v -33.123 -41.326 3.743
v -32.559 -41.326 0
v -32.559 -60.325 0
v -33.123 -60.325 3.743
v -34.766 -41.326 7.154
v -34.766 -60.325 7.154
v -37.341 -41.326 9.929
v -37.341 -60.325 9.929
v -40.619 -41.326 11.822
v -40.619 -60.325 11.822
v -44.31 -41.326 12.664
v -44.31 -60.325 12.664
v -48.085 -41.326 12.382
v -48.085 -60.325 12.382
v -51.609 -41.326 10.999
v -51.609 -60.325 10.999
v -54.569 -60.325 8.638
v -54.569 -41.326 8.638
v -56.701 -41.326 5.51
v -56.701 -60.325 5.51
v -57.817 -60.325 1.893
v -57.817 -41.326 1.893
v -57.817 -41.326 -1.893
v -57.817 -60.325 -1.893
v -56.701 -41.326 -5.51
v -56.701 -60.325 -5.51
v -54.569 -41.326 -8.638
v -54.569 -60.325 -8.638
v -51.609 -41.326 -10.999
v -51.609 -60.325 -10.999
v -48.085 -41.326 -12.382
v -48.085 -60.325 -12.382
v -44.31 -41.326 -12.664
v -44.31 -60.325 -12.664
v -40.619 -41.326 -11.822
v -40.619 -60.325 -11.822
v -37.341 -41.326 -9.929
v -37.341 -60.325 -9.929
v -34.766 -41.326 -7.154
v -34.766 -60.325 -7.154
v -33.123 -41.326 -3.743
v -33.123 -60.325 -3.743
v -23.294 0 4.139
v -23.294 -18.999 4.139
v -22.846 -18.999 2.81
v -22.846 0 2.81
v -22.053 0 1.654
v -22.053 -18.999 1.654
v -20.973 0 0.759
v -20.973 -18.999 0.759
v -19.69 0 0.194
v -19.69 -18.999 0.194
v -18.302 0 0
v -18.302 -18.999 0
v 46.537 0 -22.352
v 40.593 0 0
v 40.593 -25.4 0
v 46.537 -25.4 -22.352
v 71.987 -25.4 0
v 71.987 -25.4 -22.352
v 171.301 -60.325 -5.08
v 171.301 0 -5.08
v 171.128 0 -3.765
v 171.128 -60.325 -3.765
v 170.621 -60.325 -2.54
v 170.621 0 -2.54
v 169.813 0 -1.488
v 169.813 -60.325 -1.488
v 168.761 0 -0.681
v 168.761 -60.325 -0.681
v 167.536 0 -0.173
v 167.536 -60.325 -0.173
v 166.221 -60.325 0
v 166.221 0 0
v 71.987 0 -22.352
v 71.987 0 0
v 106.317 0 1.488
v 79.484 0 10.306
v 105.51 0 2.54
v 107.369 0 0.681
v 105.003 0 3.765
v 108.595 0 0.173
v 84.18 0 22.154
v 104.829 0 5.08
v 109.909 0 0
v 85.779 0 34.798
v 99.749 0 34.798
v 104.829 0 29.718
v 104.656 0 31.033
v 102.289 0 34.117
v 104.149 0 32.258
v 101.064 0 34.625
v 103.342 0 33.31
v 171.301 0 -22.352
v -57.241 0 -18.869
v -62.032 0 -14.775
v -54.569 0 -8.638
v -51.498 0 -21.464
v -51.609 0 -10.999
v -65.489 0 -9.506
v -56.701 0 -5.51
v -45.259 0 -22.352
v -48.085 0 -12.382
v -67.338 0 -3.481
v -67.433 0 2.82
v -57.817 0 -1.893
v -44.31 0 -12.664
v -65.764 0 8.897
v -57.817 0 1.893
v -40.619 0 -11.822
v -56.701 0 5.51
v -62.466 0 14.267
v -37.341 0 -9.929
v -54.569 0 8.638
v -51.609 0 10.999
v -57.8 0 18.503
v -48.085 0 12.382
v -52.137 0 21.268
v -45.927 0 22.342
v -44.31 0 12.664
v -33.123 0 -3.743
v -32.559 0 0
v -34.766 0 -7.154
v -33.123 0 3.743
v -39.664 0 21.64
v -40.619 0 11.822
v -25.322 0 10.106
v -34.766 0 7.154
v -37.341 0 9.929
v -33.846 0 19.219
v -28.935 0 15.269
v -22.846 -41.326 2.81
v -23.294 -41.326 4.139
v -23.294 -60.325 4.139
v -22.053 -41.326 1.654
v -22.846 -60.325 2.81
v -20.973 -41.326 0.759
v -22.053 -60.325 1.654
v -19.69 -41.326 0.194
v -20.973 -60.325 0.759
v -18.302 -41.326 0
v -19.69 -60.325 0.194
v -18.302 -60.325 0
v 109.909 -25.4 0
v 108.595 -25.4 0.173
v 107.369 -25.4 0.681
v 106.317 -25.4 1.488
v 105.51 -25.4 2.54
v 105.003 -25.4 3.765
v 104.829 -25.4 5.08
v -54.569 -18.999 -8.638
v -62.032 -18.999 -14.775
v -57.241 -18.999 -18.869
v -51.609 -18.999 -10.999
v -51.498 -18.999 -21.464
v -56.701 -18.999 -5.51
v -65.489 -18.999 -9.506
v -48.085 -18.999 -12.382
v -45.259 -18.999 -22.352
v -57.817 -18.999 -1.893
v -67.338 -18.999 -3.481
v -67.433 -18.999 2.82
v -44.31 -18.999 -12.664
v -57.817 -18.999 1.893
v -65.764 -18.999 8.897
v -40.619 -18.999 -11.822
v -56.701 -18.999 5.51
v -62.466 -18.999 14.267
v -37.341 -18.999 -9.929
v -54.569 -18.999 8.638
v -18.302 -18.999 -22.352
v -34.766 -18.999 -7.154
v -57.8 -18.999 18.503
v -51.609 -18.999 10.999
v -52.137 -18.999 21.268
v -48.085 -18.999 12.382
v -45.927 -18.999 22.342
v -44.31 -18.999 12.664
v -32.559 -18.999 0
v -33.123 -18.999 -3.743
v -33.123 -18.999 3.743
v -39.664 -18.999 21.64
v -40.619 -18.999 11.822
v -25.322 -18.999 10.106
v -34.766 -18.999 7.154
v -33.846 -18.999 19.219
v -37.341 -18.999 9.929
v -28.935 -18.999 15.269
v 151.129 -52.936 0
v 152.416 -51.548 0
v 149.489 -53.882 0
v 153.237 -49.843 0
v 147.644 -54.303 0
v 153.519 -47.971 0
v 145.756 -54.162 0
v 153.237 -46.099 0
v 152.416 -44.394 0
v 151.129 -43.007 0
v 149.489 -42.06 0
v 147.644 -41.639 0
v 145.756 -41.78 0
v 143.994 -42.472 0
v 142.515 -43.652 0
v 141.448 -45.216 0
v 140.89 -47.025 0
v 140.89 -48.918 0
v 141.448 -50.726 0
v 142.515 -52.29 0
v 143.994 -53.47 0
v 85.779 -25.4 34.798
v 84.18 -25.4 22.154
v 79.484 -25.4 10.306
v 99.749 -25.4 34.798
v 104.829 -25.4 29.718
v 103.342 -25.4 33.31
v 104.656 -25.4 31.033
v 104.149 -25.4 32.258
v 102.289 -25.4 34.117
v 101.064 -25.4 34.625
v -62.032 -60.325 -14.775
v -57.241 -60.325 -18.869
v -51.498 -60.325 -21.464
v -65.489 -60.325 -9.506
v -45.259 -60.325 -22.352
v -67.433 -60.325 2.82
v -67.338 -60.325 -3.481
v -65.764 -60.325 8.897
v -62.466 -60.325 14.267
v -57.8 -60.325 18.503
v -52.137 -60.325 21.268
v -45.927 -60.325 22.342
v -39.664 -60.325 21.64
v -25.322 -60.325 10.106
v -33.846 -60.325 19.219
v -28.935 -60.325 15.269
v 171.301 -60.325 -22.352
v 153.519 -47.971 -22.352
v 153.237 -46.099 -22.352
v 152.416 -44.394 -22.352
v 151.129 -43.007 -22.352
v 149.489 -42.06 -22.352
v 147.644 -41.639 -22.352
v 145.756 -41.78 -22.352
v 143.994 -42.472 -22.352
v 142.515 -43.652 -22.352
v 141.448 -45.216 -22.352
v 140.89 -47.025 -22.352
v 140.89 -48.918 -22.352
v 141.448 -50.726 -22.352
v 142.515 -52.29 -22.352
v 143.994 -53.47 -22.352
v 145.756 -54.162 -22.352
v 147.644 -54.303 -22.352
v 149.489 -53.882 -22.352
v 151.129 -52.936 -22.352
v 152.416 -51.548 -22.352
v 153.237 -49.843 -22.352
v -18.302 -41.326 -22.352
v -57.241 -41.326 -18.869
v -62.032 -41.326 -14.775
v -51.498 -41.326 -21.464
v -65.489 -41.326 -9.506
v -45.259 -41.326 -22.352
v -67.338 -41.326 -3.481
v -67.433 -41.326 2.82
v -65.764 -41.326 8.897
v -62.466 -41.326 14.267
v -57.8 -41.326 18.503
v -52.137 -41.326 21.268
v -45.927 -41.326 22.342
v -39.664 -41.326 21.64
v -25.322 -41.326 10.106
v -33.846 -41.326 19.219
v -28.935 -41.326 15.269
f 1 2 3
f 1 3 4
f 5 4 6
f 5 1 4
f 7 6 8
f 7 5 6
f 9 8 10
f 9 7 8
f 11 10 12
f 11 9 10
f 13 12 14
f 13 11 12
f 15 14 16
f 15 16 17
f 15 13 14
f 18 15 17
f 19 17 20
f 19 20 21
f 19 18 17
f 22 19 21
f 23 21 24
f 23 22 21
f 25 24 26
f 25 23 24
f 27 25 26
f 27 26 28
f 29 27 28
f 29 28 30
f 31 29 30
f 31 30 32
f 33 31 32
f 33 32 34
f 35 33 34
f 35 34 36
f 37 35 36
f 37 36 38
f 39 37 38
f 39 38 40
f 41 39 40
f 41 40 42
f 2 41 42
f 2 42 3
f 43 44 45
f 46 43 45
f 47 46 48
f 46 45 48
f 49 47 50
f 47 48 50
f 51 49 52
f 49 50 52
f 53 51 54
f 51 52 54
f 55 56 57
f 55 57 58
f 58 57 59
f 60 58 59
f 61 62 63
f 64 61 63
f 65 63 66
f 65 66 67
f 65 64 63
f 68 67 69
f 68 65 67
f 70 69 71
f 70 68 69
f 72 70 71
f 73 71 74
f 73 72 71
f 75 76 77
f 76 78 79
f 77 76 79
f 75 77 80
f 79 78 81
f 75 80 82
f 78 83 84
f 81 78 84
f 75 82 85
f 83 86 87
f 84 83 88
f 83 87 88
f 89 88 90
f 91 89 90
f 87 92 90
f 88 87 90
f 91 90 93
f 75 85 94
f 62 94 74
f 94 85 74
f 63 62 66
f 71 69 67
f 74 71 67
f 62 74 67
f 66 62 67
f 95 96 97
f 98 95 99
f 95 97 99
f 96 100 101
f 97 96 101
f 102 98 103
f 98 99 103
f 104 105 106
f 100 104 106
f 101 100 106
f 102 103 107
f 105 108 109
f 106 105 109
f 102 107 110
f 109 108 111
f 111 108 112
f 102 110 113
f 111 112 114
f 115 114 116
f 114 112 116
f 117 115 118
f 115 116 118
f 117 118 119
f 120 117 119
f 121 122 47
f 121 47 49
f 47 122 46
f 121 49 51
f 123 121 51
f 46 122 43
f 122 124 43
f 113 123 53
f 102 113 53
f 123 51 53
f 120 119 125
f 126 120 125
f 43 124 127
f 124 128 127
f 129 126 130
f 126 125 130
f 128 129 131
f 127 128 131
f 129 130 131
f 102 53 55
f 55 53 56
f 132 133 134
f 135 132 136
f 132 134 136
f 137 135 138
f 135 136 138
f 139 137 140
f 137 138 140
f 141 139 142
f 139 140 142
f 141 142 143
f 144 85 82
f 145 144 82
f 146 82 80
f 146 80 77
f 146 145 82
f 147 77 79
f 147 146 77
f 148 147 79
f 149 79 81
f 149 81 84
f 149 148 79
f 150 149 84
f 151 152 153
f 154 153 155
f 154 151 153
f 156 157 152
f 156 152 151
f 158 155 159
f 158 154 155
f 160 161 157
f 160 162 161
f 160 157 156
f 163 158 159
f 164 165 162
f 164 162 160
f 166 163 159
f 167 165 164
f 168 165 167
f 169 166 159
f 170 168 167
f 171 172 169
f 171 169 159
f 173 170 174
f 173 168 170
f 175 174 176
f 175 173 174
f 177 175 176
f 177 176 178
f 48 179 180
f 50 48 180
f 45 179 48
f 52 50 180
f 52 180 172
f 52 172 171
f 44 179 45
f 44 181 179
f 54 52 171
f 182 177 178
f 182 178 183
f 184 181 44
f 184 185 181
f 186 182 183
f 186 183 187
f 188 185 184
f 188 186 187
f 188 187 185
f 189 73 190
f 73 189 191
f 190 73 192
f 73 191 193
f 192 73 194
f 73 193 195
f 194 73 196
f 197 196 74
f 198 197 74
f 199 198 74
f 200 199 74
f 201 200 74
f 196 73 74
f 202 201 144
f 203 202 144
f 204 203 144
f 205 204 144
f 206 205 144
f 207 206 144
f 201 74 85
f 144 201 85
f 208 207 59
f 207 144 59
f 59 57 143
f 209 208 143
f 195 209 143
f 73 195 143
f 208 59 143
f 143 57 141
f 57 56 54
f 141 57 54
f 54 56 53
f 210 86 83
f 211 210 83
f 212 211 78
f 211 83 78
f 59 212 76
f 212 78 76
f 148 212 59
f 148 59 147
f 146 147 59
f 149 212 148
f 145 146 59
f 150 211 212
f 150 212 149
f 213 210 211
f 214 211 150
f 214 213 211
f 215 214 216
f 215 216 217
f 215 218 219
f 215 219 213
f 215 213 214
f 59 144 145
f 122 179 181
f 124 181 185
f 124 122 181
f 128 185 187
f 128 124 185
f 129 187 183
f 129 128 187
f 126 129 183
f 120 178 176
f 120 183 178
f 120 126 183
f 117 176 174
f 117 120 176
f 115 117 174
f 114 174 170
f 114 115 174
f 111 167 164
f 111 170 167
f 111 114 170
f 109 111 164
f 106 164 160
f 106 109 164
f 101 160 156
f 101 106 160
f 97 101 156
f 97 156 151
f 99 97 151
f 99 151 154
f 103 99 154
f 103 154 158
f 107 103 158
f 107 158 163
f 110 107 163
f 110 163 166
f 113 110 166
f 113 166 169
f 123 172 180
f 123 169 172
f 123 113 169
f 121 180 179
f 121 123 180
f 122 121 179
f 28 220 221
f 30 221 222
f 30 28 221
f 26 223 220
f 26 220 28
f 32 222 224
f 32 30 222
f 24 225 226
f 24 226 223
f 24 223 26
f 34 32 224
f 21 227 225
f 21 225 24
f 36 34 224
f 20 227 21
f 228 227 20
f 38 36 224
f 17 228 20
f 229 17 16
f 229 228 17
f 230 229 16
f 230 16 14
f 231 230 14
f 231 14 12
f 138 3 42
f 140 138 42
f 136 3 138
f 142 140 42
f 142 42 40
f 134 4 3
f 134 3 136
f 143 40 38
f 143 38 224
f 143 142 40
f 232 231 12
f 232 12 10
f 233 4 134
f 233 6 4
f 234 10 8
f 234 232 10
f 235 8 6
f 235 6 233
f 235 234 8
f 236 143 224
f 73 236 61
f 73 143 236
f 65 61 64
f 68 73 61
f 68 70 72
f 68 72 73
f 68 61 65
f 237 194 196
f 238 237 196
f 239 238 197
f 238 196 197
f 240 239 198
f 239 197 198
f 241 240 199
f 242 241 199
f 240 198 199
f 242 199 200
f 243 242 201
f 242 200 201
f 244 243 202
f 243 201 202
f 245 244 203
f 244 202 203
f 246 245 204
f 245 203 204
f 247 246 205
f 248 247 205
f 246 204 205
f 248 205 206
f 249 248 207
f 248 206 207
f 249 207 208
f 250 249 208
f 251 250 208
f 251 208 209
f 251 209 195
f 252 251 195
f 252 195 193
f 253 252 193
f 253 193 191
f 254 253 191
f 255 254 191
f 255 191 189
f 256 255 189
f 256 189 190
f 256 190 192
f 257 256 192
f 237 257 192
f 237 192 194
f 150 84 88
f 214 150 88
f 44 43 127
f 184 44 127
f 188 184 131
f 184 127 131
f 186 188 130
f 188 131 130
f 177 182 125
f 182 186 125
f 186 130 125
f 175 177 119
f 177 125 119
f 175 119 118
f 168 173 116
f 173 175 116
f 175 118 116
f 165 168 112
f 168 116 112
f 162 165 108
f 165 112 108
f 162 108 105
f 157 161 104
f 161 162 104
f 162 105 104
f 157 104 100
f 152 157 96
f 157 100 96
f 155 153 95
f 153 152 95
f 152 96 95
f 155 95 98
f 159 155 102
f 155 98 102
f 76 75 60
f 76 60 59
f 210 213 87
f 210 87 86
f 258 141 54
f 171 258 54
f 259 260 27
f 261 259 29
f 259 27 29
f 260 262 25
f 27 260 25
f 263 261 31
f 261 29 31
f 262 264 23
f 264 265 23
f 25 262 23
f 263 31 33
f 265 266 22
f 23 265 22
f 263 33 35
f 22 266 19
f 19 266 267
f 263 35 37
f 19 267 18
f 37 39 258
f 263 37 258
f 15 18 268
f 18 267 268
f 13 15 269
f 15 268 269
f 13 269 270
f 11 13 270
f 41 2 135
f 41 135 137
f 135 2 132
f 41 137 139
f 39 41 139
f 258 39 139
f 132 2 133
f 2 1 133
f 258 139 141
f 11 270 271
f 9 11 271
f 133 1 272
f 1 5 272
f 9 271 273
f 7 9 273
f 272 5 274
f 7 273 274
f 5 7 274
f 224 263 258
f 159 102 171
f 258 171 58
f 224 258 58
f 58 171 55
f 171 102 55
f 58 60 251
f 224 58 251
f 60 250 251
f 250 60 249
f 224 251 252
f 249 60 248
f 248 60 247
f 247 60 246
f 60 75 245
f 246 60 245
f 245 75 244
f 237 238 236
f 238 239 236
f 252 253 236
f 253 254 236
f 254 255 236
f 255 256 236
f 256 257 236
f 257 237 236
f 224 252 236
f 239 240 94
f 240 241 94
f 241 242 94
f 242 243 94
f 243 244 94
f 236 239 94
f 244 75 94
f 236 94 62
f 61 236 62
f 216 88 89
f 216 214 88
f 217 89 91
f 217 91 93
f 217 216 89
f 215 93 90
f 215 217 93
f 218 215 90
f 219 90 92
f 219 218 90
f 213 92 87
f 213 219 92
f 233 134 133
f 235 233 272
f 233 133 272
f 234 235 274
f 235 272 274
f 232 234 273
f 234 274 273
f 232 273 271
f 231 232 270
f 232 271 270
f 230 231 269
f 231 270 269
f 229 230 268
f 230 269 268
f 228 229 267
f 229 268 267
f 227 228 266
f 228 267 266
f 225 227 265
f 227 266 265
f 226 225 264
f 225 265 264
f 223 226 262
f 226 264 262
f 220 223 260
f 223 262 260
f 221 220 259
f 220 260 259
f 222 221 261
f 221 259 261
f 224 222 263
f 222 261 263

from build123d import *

# Parameters (mm, degrees)
F0_R     = 12.7
F1_DEPTH = 60.325
F2_R     = 5.08
F3_W     = 52.5957527157
F3_H     = 22.3266
F4_DEPTH = 25.908
F5_DEPTH = 25.4
F6_DEPTH = 25.4
F7_R     = 5.08
F8_R     = 6.35
F9_DEPTH = 25.4


with BuildPart() as f1:
    # F0 (on Front) → F1 (new body)
    with BuildSketch(Plane.XZ):
        with BuildLine():
            ThreePointArc((-45.2591143548, -22.352), (-29.4538635818, -15.8052507731), (-22.9071143548, 0))
            ThreePointArc((-22.9071143548, 0), (-61.0643651279, 15.8052507731), (-45.2591143548, -22.352))
        make_face()
        with Locations((-45.2591143548, 0)):
            Circle(F0_R, mode=Mode.SUBTRACT)
        Polygon((104.8294856452, 0), (71.9872856452, 0), (71.9872856452, -22.352), (171.3012856452, -22.352), (171.3012856452, 0), align=None)
        with BuildLine():
            Line((40.5928856452, 0), (-22.9071143548, 0))
            ThreePointArc((-22.9071143548, 0), (-29.4538635818, -15.8052507731), (-45.2591143548, -22.352))
            Line((-45.2591143548, -22.352), (46.5366914868, -22.352))
            Line((46.5366914868, -22.352), (40.5928856452, 0))
        make_face()
        Polygon((71.9872856452, 0), (40.5928856452, 0), (46.5366914868, -22.352), (71.9872856452, -22.352), align=None)
    extrude(amount=F1_DEPTH)

    # F2
    f2_edges = [f1.edges().sort_by_distance(p)[0] for p in [
        (-22.907114, -30.1625, 0),
        (171.301286, -30.1625, 0),
    ]]
    fillet(f2_edges, radius=F2_R)

    # F3 (on face) → F4 (cut, symmetric)
    with BuildSketch(Plane.XY):
        with Locations((-44.5994644167, -30.1625)):
            Rectangle(F3_W, F3_H)
    extrude(amount=F4_DEPTH, both=True, mode=Mode.SUBTRACT)

    # F0 (on Front) → F5 (join)
    with BuildSketch(Plane.XZ):
        with BuildLine():
            ThreePointArc((85.7794856452, 34.798), (82.2053010067, 16.0823576341), (71.9872856452, 0))
            Line((71.9872856452, 0), (104.8294856452, 0))
            Line((104.8294856452, 0), (104.8294856452, 34.798))
            Line((104.8294856452, 34.798), (85.7794856452, 34.798))
        make_face()
    extrude(amount=F5_DEPTH)

    # F0 (on Front) → F6 (cut)
    with BuildSketch(Plane.XZ):
        Polygon((71.9872856452, 0), (40.5928856452, 0), (46.5366914868, -22.352), (71.9872856452, -22.352), align=None)
    extrude(amount=F6_DEPTH, mode=Mode.SUBTRACT)

    # F7
    f7_edges = [f1.edges().sort_by_distance(p)[0] for p in [
        (104.829486, -12.7, 0),
        (104.829486, -12.7, 34.798),
    ]]
    fillet(f7_edges, radius=F7_R)

    # F8 (on face) → F9 (cut)
    with BuildSketch(Plane.XY):
        with Locations((147.1694111824, -47.9711517692)):
            Circle(F8_R)
    extrude(amount=-F9_DEPTH, mode=Mode.SUBTRACT)


solid = f1.part
